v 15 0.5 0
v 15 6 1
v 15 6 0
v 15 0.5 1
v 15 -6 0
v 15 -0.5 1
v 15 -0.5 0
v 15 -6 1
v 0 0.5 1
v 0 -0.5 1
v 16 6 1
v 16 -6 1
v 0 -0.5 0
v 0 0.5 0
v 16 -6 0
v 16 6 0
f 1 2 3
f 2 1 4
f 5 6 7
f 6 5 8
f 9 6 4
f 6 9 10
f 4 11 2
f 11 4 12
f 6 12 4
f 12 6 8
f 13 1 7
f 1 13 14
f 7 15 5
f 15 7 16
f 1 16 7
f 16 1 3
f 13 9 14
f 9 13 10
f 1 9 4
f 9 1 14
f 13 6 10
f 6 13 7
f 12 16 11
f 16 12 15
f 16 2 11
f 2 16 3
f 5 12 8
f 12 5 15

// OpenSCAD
module ground(length, width, thickness, height)
{
    translate([0,-thickness/2,0])cube([length/2, thickness, height]);
    
    translate([length/2,-width/2, 0])cube([thickness, width, height]);
}

ground(30, 12, 1, 1);
